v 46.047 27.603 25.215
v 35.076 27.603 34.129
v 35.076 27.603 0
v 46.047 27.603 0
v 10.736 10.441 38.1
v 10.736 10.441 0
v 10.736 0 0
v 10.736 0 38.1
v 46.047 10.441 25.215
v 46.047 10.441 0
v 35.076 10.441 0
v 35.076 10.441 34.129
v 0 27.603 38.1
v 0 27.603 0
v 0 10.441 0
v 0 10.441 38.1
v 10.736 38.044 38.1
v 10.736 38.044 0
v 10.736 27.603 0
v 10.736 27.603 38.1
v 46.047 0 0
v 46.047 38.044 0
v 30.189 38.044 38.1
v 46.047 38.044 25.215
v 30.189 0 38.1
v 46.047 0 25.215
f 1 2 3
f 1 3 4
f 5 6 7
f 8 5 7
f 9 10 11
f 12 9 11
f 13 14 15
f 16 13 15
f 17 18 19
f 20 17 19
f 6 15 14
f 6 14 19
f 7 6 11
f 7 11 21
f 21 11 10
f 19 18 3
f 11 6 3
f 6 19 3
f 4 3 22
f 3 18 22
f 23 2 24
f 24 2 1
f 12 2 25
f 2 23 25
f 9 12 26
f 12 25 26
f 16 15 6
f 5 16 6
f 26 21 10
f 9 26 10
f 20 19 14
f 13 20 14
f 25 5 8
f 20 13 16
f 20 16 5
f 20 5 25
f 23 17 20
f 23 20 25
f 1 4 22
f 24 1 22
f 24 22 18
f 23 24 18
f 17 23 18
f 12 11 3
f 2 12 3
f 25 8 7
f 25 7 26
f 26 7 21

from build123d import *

# Parameters (mm, degrees)
F2_DEPTH = 38.1
F3_DEPTH = 50.8


with BuildPart() as f2:
    # F1 (on Top) → F2 (new body)
    with BuildSketch(Plane.XY):
        Polygon((24.104279, 0), (46.047091, 0), (46.047091, 10.441257), (35.075685, 10.441257), (35.075685, 27.602856), (46.047091, 27.602856), (46.047091, 38.044113), (24.104279, 38.044113), align=None)
        Polygon((10.73552, 0), (24.104279, 0), (24.104279, 38.044113), (10.73552, 38.044113), (10.73552, 27.602856), (0, 27.602856), (0, 10.441257), (10.73552, 10.441257), align=None)
    extrude(amount=F2_DEPTH)

    # F0 (on Front) → F3 (cut)
    with BuildSketch(Plane.XZ):
        Polygon((24.104279, 43.043356), (46.047091, 25.215129), (46.047091, 43.043356), align=None)
    extrude(amount=-F3_DEPTH, mode=Mode.SUBTRACT)


solid = f2.part
